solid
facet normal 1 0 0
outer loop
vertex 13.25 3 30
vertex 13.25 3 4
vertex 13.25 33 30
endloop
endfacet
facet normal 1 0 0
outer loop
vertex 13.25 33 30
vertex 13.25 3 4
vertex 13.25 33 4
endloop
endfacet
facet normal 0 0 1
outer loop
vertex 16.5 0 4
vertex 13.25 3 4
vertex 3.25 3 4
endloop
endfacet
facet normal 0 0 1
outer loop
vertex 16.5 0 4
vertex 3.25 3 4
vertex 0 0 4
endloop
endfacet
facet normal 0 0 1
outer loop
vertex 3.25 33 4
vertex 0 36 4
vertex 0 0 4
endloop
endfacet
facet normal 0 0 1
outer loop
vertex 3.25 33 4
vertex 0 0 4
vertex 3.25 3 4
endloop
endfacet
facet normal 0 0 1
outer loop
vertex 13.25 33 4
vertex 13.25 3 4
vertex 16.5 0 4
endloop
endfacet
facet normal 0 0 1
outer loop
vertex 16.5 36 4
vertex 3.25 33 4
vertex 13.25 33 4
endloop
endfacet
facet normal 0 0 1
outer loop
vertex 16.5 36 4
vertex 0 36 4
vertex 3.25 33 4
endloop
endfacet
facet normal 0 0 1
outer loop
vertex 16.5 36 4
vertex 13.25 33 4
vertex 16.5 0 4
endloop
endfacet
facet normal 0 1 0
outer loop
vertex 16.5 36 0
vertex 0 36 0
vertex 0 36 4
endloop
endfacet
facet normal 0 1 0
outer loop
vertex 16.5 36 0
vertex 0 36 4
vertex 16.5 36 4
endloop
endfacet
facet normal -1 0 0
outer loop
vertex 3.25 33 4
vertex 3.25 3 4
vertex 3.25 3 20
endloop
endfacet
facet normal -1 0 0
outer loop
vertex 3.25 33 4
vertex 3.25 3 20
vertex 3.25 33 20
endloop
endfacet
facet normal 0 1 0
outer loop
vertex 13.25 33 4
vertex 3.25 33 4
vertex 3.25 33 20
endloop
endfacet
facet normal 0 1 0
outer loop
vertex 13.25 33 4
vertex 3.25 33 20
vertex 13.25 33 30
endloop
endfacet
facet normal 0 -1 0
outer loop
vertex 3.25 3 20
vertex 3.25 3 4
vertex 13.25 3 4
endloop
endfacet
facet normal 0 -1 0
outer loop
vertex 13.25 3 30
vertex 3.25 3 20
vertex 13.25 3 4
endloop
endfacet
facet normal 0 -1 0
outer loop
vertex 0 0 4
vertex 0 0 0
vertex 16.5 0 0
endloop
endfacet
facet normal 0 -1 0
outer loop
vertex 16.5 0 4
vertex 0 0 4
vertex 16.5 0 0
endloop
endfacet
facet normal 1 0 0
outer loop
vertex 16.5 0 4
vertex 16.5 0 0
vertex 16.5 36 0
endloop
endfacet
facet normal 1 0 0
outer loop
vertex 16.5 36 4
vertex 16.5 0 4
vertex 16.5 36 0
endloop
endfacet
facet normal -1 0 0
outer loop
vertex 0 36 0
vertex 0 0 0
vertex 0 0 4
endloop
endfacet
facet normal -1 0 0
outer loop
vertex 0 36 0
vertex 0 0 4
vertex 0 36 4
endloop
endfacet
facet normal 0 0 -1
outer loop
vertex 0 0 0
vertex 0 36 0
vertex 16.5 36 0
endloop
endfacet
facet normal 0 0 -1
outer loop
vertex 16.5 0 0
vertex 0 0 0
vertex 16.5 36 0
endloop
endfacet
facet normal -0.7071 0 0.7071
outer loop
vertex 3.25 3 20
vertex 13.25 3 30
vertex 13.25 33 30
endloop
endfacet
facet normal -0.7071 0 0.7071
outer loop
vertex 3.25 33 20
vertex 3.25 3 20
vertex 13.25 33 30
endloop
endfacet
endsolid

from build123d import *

# Parameters (mm, degrees)
F0_W     = 16.5
F0_H     = 36
F1_DEPTH = 4
F2_W     = 10
F2_H     = 30
F3_DEPTH = 30
F4_SIZE  = 9.99999


# Not quite as in the source:
# - a fillet or chamfer is up to 0.001 mm smaller than in the source, because OpenCascade refuses the exact size


with BuildPart() as f1:
    # F0 (on Top) → F1 (new body)
    with BuildSketch(Plane.XY):
        with Locations((8.25, 18)):
            Rectangle(F0_W, F0_H)
    extrude(amount=F1_DEPTH)

    # F2 (on Top) → F3 (join)
    with BuildSketch(Plane.XY):
        with Locations((8.25, 18)):
            Rectangle(F2_W, F2_H)
    extrude(amount=F3_DEPTH)

    # F4 (size 10 in the source; OpenCascade refuses exactly that, so slightly less here)
    f4_edges = [f1.edges().sort_by_distance(p)[0] for p in [
        (3.25, 18, 30),
    ]]
    chamfer(f4_edges, length=F4_SIZE)


solid = f1.part
